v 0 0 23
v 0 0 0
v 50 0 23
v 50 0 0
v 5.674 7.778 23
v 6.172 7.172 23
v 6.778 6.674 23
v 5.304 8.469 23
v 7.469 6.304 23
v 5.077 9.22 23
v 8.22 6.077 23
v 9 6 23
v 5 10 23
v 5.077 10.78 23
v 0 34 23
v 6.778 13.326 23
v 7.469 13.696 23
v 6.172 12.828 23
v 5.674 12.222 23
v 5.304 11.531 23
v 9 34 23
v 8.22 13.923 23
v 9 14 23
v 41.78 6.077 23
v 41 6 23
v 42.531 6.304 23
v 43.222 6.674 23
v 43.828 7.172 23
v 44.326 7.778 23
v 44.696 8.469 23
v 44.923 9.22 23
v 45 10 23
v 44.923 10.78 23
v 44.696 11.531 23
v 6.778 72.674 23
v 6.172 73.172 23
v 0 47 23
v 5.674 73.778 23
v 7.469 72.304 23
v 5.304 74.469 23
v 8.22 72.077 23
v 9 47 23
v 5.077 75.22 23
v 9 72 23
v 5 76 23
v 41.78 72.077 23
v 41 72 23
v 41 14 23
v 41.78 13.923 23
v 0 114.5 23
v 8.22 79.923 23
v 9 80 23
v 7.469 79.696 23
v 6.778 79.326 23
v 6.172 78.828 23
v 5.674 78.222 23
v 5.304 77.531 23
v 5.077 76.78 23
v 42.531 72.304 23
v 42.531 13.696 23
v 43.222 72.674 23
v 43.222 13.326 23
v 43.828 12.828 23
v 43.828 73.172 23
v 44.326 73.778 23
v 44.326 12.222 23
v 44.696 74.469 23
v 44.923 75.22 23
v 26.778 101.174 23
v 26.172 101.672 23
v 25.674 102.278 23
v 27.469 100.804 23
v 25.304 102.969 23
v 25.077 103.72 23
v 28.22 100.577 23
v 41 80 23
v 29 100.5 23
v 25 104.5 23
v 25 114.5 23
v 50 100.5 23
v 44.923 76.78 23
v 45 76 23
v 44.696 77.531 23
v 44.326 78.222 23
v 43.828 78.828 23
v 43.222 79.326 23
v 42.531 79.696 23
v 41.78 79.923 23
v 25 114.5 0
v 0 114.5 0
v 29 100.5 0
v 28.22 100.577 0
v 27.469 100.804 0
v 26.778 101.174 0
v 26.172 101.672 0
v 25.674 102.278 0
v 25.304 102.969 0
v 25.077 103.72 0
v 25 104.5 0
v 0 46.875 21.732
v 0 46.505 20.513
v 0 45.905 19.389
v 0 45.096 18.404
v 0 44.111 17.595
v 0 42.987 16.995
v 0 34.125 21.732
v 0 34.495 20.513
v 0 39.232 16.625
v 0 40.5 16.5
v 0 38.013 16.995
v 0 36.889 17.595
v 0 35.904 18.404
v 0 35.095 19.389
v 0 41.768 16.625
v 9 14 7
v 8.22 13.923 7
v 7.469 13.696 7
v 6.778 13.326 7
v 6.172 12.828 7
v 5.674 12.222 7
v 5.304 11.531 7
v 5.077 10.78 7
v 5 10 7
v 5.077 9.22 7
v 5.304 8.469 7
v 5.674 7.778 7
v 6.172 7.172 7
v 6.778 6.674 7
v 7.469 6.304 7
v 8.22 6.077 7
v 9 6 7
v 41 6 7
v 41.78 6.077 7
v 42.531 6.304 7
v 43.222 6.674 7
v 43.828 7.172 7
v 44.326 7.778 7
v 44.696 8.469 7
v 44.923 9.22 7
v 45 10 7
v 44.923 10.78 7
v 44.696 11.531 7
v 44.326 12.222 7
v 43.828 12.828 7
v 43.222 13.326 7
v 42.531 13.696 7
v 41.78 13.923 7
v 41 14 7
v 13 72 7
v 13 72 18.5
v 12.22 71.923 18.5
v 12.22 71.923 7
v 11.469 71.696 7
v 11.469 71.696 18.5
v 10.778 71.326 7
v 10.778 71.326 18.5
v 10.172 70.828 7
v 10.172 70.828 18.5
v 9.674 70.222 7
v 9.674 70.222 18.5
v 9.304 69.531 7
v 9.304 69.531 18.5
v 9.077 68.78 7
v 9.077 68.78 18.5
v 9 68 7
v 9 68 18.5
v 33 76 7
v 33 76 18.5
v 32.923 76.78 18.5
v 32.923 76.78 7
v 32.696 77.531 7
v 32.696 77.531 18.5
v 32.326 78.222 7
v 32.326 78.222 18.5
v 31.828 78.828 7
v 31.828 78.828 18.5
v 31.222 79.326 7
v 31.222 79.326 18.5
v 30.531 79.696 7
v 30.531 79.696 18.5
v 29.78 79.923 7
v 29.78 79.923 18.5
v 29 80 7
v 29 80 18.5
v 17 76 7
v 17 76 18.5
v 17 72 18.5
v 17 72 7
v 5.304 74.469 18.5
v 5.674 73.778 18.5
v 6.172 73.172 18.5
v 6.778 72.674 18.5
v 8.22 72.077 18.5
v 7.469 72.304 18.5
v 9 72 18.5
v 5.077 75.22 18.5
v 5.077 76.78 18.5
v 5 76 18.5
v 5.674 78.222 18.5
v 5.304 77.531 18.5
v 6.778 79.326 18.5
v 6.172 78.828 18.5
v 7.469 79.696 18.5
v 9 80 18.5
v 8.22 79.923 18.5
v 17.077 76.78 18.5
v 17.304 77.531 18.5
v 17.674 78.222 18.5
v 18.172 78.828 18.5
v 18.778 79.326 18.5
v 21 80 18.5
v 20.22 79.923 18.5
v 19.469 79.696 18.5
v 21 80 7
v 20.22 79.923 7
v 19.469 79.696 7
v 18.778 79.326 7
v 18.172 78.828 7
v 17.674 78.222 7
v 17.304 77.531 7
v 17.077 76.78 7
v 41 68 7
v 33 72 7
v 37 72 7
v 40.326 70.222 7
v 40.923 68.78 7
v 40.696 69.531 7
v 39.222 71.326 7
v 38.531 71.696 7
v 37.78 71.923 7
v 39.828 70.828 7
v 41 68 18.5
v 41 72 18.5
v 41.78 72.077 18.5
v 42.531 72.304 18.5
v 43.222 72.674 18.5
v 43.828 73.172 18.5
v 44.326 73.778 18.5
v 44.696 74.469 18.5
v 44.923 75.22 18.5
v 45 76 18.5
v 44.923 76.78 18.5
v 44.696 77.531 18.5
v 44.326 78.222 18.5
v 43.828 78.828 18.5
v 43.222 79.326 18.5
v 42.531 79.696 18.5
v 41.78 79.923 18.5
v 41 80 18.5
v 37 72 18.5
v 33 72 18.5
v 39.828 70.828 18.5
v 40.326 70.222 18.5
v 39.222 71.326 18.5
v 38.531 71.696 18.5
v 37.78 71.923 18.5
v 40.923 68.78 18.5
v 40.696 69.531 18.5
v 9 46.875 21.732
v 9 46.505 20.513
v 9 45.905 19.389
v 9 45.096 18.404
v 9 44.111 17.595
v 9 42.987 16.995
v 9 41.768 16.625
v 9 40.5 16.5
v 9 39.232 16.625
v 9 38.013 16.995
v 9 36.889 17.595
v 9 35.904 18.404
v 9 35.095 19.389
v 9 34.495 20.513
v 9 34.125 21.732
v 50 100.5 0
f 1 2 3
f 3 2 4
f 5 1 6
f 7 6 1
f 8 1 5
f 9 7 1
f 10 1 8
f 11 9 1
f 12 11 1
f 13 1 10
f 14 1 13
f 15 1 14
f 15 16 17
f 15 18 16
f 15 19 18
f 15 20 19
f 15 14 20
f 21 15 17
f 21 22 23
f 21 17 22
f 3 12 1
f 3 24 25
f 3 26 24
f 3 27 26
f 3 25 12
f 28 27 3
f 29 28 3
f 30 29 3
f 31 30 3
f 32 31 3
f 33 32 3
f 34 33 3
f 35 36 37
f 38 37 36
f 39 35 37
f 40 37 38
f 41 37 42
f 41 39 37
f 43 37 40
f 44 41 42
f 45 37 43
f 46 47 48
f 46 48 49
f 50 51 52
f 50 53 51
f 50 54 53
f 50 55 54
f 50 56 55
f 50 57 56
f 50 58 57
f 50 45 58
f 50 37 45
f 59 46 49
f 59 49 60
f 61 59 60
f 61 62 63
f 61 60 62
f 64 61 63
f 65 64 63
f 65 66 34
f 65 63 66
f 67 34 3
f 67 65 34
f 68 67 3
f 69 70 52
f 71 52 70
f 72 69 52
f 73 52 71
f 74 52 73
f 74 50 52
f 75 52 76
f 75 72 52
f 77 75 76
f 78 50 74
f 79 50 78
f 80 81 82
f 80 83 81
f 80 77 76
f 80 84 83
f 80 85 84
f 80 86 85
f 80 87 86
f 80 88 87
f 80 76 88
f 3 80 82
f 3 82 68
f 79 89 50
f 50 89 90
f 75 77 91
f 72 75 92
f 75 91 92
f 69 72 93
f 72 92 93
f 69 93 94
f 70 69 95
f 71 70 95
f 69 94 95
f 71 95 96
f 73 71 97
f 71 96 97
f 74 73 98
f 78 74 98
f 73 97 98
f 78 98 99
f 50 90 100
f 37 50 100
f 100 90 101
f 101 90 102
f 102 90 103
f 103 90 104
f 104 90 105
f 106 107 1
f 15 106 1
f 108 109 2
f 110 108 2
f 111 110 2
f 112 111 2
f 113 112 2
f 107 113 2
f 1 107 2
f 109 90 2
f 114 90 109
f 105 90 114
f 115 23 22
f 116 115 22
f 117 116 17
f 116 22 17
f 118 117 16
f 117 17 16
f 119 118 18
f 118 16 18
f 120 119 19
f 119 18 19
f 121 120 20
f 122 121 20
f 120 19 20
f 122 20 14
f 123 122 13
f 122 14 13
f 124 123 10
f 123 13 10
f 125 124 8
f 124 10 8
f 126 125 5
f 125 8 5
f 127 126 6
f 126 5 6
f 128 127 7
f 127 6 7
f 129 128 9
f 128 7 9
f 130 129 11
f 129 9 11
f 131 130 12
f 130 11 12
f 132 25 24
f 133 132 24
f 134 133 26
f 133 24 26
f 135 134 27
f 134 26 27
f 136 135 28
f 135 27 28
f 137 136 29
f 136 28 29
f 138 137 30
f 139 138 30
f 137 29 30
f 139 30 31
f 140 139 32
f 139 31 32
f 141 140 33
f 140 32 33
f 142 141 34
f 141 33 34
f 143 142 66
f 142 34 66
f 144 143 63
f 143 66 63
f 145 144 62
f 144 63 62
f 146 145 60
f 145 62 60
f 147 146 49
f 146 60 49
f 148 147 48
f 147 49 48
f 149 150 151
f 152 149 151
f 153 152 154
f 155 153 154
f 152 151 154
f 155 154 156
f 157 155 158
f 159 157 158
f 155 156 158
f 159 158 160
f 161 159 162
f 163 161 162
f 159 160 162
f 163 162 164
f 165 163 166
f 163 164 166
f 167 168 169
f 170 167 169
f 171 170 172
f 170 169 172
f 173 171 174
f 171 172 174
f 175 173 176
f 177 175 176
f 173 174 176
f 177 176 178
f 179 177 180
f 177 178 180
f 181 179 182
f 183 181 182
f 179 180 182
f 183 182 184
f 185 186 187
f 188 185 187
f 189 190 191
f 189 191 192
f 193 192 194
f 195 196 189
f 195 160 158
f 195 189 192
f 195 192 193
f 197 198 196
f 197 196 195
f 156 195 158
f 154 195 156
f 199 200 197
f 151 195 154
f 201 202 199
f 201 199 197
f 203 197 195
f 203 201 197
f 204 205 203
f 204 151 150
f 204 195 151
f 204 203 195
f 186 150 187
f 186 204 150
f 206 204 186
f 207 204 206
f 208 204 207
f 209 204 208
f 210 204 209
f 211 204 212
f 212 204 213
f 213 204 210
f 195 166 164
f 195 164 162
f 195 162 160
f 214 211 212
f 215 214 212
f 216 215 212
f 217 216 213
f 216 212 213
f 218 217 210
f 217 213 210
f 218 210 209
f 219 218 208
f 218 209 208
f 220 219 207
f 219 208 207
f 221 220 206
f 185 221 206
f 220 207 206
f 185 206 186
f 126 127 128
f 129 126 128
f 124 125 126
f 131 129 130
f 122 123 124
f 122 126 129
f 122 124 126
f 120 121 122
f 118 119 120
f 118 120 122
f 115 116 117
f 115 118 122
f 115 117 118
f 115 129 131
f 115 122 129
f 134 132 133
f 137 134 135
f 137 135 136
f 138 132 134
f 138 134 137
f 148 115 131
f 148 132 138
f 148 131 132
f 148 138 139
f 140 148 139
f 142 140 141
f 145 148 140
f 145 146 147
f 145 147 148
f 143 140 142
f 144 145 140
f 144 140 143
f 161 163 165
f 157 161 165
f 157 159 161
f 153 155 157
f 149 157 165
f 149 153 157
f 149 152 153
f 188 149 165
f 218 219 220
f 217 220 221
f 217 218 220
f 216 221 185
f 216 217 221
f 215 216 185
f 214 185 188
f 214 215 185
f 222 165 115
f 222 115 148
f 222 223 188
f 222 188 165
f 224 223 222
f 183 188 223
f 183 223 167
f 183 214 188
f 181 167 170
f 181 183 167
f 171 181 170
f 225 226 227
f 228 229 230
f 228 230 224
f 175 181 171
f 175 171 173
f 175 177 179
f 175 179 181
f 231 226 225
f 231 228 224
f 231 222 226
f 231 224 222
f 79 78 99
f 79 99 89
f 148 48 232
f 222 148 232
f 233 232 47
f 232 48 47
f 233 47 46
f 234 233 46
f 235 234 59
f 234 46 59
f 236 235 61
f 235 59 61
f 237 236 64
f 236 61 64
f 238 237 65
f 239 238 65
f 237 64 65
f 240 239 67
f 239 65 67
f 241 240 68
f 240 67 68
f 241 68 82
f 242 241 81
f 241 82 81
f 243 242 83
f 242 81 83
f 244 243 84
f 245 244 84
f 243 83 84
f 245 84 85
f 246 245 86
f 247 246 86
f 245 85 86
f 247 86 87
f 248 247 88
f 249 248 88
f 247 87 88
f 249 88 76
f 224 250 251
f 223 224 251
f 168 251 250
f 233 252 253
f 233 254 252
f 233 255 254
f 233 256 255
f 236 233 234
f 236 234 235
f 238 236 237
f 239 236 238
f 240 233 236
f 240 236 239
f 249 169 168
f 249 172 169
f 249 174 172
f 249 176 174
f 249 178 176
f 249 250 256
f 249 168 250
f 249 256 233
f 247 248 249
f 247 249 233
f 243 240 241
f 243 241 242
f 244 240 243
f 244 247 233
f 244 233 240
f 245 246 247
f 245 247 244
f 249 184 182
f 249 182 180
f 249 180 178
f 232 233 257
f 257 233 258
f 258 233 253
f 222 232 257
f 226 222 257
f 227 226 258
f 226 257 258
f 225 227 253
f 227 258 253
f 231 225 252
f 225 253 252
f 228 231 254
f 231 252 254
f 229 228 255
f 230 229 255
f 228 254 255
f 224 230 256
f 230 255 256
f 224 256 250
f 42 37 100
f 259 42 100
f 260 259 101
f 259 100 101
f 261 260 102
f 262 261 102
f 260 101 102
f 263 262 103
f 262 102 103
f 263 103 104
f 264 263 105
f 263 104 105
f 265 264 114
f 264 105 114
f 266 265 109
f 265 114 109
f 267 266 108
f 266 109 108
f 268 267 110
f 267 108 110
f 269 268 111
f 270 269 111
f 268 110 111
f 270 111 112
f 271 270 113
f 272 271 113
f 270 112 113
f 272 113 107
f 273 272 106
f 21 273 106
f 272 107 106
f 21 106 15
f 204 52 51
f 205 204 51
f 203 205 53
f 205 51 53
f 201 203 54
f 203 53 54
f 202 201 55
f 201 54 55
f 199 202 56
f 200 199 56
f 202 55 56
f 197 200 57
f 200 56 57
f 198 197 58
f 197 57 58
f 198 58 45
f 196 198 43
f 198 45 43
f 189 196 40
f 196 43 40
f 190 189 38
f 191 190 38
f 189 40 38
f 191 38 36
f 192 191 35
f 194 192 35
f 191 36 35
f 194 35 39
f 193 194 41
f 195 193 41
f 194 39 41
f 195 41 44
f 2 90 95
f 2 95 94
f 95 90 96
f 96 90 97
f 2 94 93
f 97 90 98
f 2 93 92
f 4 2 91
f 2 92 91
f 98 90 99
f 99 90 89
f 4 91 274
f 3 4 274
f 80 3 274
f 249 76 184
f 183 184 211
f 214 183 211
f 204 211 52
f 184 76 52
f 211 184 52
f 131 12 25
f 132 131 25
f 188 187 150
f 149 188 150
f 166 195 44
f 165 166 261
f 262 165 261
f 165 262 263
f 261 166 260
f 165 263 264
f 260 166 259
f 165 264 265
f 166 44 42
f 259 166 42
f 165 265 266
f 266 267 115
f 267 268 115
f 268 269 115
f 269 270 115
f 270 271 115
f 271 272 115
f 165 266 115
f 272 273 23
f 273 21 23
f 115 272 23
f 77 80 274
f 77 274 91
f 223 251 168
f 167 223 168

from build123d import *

# Parameters (mm, degrees)
F1_DEPTH = 23
F3_DEPTH = 4.5
F5_DEPTH = 11.5
F6_R     = 6.5
F7_DEPTH = 9


with BuildPart() as f1:
    # F0 (on Top) → F1 (new body)
    with BuildSketch(Plane.XY):
        with BuildLine():
            Line((0, 114.5), (0, 0))
            Line((0, 0), (50, 0))
            Line((50, 0), (50, 100.5))
            Line((50, 100.5), (29, 100.5))
            ThreePointArc((29, 100.5), (26.171573, 101.671573), (25, 104.5))
            Line((25, 104.5), (25, 114.5))
            Line((25, 114.5), (0, 114.5))
        make_face()
    extrude(amount=F1_DEPTH)

    # F2 (on face) → F3 (cut)
    with BuildSketch(Plane.XY.offset(23)):
        with BuildLine():
            Line((41, 80), (9, 80))
            ThreePointArc((9, 80), (5, 76), (9, 72))
            Line((9, 72), (9, 14))
            ThreePointArc((9, 14), (5, 10), (9, 6))
            Line((9, 6), (41, 6))
            ThreePointArc((41, 6), (45, 10), (41, 14))
            Line((41, 14), (41, 72))
            ThreePointArc((41, 72), (45, 76), (41, 80))
        make_face()
    extrude(amount=-F3_DEPTH, mode=Mode.SUBTRACT)

    # F4 (on face) → F5 (cut)
    with BuildSketch(Plane.XY.offset(18.5)):
        with BuildLine():
            Line((9, 68), (9, 14))
            ThreePointArc((9, 14), (5, 10), (9, 6))
            Line((9, 6), (41, 6))
            ThreePointArc((41, 6), (45, 10), (41, 14))
            Line((41, 14), (41, 68))
            ThreePointArc((41, 68), (39.828427, 70.828427), (37, 72))
            Line((37, 72), (33, 72))
            Line((33, 72), (33, 76))
            ThreePointArc((33, 76), (31.828427, 78.828427), (29, 80))
            Line((29, 80), (21, 80))
            ThreePointArc((21, 80), (18.171573, 78.828427), (17, 76))
            Line((17, 76), (17, 72))
            Line((17, 72), (13, 72))
            ThreePointArc((13, 72), (10.171573, 70.828427), (9, 68))
        make_face()
    extrude(amount=-F5_DEPTH, mode=Mode.SUBTRACT)

    # F6 (on face) → F7 (cut, through all)
    with BuildSketch(Plane(origin=(0, 0, 0), x_dir=(0, -1, 0), z_dir=(-1, 0, 0))):
        with Locations((-40.5, 23)):
            Circle(F6_R)
    extrude(amount=-F7_DEPTH, mode=Mode.SUBTRACT)


solid = f1.part
